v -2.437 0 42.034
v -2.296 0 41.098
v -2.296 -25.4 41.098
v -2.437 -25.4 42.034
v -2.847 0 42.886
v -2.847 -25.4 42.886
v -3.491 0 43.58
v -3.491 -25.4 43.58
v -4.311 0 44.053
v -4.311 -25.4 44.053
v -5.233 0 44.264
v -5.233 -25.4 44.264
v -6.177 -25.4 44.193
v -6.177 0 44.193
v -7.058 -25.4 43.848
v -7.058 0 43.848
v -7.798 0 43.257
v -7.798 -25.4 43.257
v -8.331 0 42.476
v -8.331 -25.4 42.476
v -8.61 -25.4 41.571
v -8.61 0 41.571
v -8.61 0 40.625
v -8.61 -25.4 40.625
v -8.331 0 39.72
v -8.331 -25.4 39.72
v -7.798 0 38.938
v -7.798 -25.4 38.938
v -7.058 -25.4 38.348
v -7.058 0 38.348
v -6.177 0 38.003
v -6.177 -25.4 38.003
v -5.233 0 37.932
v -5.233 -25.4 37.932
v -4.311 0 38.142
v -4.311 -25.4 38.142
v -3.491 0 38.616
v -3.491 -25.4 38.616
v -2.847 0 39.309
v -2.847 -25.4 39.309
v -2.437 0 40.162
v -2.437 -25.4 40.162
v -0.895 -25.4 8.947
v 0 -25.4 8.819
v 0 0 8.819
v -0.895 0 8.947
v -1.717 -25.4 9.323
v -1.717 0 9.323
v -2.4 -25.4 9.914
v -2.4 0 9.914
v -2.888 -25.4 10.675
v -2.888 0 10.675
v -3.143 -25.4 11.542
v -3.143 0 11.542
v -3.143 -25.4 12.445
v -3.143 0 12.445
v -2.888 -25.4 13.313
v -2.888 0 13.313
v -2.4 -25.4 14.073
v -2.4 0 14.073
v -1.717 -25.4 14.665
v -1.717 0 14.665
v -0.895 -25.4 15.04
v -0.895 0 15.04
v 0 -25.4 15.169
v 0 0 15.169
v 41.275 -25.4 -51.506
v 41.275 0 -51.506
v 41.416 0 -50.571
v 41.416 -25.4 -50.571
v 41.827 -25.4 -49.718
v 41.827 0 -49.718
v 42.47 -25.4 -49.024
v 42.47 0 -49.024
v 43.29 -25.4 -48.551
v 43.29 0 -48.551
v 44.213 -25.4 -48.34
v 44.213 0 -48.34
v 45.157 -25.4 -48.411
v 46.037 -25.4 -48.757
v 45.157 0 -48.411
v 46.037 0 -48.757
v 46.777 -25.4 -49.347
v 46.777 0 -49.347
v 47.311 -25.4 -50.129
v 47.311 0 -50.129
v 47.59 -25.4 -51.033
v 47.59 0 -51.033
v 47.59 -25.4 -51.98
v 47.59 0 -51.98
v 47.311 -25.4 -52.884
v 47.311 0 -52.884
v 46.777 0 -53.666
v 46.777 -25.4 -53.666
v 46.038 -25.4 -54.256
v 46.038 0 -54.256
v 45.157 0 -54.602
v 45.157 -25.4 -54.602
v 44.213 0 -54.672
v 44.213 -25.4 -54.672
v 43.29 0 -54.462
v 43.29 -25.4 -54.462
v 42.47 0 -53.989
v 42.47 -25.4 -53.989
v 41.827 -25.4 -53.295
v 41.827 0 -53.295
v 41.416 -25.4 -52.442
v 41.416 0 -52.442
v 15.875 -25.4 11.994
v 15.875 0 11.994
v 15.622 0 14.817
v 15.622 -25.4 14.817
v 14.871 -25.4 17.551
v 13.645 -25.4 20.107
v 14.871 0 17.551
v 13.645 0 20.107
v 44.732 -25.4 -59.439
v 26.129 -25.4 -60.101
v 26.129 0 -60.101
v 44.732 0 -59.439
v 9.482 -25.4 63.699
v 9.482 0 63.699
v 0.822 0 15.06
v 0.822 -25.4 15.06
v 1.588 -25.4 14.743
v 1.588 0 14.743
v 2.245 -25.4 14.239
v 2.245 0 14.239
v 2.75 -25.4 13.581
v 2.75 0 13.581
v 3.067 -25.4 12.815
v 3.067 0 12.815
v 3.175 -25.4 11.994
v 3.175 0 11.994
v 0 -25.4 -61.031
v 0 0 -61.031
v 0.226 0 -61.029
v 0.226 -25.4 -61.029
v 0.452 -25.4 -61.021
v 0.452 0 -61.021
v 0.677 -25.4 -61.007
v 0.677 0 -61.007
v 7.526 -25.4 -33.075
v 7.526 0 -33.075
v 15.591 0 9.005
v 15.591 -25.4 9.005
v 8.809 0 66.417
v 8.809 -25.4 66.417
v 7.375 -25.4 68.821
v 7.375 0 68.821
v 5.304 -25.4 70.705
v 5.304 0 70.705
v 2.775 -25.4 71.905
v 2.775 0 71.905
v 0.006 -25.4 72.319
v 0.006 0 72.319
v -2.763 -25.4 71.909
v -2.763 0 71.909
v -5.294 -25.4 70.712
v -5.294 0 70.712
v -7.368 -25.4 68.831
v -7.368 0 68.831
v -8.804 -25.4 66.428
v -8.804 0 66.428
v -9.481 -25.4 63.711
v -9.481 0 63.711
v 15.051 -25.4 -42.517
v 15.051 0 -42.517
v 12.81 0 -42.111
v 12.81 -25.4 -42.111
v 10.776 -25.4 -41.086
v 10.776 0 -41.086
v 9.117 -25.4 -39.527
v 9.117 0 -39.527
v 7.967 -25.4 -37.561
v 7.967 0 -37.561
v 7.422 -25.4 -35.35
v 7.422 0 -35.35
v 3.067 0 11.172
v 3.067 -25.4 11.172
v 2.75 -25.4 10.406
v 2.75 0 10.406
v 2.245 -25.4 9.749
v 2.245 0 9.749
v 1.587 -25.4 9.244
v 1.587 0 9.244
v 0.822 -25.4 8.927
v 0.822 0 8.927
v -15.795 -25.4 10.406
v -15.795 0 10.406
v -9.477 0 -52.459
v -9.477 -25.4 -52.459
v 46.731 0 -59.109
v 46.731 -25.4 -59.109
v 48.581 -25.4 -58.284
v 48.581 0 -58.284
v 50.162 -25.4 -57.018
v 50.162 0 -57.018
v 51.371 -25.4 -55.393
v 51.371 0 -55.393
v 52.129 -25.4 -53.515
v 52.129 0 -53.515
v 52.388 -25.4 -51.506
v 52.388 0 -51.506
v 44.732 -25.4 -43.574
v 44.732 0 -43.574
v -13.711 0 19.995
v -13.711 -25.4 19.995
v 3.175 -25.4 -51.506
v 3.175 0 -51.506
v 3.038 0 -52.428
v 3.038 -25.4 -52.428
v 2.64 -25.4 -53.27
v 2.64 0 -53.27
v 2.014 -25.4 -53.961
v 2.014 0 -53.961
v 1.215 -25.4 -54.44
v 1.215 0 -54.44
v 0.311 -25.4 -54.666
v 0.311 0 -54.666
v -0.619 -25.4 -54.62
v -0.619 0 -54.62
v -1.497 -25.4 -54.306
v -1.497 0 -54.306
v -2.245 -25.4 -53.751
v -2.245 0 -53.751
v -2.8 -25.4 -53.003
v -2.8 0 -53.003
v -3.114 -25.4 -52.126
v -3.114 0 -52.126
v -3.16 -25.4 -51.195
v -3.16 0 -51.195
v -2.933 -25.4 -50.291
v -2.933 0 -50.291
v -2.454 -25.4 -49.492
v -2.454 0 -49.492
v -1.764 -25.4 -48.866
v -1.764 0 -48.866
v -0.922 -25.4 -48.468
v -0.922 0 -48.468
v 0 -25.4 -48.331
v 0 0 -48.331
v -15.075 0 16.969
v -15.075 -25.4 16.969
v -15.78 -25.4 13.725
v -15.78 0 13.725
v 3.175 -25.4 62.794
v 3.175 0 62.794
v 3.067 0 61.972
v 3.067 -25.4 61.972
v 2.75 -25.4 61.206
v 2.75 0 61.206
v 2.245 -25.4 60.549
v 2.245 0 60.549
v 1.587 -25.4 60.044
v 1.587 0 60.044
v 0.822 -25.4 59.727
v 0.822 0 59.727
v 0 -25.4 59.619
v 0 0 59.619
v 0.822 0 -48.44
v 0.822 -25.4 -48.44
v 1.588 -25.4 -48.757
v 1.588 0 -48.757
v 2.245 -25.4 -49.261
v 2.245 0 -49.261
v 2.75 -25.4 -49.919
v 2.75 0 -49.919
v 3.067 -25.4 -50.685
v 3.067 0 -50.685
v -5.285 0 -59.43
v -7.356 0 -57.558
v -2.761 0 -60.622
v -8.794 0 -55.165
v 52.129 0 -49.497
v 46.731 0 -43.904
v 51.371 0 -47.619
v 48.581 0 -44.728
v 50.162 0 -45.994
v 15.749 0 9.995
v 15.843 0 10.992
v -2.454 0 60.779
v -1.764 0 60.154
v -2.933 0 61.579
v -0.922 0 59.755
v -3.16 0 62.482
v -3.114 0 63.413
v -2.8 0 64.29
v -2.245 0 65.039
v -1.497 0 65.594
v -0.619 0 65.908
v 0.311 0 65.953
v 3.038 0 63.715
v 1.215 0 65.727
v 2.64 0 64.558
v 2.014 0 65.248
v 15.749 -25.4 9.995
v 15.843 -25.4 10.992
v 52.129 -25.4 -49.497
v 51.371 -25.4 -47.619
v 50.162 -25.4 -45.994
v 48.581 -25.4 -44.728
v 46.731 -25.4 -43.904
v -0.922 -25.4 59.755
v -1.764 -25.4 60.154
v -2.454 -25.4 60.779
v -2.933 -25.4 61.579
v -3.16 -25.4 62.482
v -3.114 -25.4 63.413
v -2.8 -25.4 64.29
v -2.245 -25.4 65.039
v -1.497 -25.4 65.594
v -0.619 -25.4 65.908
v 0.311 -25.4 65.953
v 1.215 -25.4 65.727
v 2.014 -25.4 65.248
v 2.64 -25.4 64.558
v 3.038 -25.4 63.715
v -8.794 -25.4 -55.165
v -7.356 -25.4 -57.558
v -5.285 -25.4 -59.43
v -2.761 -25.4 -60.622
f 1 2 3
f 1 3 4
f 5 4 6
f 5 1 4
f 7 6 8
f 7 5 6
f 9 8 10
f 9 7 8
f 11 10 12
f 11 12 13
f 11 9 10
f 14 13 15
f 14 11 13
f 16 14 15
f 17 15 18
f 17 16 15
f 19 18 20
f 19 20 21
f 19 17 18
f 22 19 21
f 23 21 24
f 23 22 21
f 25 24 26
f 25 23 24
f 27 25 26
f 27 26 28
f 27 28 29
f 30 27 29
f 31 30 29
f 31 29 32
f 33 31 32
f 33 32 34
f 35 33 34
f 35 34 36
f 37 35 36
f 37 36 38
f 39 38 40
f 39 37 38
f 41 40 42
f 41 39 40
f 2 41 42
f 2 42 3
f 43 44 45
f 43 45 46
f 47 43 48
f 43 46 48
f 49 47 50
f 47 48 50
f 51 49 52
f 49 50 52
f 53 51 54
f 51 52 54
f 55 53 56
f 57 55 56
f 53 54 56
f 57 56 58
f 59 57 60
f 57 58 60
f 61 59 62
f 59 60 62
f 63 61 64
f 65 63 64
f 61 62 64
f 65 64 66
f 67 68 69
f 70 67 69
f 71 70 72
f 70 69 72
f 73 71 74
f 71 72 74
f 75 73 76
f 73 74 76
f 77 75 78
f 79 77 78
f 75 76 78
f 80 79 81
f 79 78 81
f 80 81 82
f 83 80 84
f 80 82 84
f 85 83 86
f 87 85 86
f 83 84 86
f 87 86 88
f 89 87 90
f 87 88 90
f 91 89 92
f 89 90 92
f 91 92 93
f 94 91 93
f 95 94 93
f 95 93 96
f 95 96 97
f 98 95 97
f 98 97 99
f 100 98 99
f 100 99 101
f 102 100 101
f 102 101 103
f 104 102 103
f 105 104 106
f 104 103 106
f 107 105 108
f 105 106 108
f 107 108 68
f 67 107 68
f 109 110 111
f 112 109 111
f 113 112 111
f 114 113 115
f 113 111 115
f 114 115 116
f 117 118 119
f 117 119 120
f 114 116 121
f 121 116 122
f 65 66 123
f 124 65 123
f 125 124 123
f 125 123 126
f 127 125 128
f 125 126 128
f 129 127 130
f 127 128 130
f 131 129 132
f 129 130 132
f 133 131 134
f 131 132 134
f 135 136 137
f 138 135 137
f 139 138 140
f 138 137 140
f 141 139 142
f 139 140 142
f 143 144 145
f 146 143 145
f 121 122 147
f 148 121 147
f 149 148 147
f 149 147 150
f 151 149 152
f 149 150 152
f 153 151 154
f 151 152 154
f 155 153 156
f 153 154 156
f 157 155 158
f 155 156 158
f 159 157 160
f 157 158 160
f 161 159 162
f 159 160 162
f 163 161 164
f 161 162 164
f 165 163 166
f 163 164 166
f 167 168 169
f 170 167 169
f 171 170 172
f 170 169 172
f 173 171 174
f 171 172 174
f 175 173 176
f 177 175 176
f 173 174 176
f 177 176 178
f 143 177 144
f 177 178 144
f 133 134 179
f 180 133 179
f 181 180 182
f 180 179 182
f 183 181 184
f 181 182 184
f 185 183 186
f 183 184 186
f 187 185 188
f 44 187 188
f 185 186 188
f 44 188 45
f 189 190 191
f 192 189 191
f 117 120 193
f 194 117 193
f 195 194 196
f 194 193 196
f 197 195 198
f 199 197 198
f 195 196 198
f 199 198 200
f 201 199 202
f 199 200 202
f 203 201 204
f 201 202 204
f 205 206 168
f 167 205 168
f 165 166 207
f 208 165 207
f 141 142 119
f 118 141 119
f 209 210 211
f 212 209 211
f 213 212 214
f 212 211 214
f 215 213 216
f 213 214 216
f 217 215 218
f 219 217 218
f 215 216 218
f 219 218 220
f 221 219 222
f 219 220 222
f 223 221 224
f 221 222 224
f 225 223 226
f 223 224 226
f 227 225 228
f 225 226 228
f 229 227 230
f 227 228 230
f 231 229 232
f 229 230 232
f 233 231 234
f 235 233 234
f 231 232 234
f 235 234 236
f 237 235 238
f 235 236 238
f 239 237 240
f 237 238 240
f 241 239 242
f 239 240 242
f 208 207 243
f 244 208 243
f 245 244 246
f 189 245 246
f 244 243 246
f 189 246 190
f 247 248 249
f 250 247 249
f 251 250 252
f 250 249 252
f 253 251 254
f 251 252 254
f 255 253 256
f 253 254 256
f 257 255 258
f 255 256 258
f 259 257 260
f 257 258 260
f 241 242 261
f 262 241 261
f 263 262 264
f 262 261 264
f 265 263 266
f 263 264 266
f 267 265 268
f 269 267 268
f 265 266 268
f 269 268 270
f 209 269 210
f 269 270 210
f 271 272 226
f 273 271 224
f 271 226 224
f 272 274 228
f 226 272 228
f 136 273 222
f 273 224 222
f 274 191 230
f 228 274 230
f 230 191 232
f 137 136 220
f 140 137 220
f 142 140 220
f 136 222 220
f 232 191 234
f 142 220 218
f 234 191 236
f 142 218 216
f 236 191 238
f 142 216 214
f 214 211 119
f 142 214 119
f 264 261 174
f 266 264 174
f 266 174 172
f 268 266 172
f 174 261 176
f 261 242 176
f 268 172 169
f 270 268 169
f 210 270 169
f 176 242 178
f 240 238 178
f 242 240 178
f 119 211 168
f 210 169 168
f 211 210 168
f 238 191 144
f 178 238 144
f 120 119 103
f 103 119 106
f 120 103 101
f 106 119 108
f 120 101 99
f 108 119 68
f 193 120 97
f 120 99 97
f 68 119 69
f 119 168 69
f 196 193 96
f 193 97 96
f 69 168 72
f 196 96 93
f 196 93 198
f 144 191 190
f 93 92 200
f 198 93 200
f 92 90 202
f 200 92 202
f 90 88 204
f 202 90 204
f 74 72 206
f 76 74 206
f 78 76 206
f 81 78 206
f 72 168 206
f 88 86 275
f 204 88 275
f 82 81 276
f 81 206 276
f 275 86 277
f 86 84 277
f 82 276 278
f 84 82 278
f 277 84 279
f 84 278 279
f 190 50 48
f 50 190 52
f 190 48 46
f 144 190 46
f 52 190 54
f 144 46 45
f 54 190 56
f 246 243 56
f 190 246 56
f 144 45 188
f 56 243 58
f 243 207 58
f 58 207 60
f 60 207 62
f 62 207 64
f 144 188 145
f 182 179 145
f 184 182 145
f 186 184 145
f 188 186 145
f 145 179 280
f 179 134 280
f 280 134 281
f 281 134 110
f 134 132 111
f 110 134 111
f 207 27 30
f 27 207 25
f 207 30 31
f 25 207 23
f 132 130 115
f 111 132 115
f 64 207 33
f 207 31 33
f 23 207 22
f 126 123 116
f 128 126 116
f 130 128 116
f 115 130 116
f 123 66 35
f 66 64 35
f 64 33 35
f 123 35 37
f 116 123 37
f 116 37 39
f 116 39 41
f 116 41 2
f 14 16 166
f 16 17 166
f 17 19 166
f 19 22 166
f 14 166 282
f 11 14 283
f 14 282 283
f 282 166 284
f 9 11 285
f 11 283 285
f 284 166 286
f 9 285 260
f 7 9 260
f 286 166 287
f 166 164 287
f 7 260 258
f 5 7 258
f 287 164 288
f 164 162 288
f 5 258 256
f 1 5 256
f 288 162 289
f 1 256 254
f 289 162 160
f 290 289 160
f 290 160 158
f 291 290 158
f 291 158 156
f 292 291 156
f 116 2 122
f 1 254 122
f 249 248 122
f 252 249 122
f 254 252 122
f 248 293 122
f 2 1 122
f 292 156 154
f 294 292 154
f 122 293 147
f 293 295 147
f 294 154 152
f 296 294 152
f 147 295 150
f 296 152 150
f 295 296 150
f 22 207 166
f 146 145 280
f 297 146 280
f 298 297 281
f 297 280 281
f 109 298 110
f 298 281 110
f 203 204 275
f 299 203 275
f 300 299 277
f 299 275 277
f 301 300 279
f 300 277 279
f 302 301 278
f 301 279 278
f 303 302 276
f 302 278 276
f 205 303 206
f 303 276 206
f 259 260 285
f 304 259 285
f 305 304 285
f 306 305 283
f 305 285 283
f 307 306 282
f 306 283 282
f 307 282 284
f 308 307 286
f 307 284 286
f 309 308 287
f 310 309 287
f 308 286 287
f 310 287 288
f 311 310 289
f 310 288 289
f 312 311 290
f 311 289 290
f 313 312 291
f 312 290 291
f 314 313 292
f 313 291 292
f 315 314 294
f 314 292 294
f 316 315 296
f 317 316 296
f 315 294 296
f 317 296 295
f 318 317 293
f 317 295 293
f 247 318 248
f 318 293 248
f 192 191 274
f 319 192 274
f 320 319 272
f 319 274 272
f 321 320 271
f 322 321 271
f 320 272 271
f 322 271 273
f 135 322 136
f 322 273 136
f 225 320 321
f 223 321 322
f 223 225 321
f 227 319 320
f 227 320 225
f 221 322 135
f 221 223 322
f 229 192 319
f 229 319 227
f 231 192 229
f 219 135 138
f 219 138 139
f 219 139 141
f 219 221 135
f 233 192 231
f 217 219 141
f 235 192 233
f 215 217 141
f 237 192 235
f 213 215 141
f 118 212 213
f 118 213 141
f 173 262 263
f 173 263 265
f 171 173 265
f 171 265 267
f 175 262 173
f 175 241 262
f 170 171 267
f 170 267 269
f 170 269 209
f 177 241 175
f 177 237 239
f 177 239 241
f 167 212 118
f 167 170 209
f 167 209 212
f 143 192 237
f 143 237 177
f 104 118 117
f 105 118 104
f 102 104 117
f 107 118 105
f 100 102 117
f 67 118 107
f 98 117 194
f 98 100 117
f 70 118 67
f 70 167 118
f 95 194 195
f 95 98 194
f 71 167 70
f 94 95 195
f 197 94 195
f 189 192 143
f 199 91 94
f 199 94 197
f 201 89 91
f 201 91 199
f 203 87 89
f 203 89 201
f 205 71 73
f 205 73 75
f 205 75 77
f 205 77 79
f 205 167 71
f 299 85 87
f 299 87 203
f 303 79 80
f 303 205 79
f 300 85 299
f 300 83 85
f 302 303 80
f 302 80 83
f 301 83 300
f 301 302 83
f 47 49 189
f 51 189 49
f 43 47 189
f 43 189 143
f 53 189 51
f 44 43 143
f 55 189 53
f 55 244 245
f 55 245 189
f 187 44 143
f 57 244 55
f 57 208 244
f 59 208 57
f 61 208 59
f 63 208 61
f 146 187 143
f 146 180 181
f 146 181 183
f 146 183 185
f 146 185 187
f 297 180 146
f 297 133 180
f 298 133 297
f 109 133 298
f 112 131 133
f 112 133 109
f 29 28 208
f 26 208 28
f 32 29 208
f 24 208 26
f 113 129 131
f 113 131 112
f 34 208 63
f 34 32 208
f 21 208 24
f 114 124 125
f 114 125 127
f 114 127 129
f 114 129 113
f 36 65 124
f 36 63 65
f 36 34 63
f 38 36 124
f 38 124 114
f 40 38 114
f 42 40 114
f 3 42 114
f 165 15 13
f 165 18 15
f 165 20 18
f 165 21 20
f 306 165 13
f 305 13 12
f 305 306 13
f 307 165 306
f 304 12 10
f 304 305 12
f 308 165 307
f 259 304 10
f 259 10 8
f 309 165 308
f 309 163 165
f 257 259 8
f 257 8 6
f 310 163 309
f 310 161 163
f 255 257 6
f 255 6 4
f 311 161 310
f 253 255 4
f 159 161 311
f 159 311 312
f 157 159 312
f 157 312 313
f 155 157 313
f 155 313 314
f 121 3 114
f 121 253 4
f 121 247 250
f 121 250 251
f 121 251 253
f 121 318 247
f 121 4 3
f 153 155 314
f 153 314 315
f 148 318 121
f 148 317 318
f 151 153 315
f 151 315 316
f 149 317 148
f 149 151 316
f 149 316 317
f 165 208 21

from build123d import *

# Parameters (mm, degrees)
F0_R     = 3.175
F1_DEPTH = 25.4
F2_DEPTH = 25.4


with BuildPart() as f1:
    # F0 (on Front) → F1 (new body)
    with BuildSketch(Plane.XZ):
        with BuildLine():
            ThreePointArc((-9.4807107481, 63.7111065744), (-7.0521101036, 56.3910315801), (0, 53.2686379311))
            ThreePointArc((0, 53.2686379311), (6.7351920908, 56.0584458403), (9.525, 62.7936379311))
            ThreePointArc((9.525, 62.7936379311), (9.5142081889, 63.2469232041), (9.4818572097, 63.6991813339))
            ThreePointArc((9.4818572097, 63.6991813339), (0.0059901113, 72.3186360476), (-9.4807107481, 63.7111065744))
        make_face()
        with BuildLine():
            ThreePointArc((3.175, 62.7936379311), (2.2450640303, 60.5485739009), (0, 59.6186379311))
            ThreePointArc((0, 59.6186379311), (-2.2450640303, 65.0387019614), (3.175, 62.7936379311))
        make_face(mode=Mode.SUBTRACT)
        with BuildLine():
            ThreePointArc((9.525, 62.7936379311), (6.7351920908, 56.0584458403), (0, 53.2686379311))
            Line((0, 53.2686379311), (0, 27.8686379311))
            ThreePointArc((0, 27.8686379311), (7.8489973512, 25.7925098263), (13.6450153015, 20.1071564294))
            Line((13.6450153015, 20.1071564294), (9.4818572097, 63.6991813339))
            ThreePointArc((9.4818572097, 63.6991813339), (9.5142081889, 63.2469232041), (9.525, 62.7936379311))
        make_face()
        with BuildLine():
            Line((0, 27.8686379311), (0, 53.2686379311))
            ThreePointArc((0, 53.2686379311), (-7.0521101036, 56.3910315801), (-9.4807107481, 63.7111065744))
            Line((-9.4807107481, 63.7111065744), (-13.7112371906, 19.9947378369))
            ThreePointArc((-13.7112371906, 19.9947378369), (-7.9056360907, 25.7601386849), (0, 27.8686379311))
        make_face()
        with Locations((-5.4705687799, 41.0979501903)):
            Circle(F0_R, mode=Mode.SUBTRACT)
        with BuildLine():
            ThreePointArc((13.6450153015, 20.1071564294), (7.8489973512, 25.7925098263), (0, 27.8686379311))
            Line((0, 27.8686379311), (0, 15.1686379311))
            ThreePointArc((0, 15.1686379311), (2.2450640303, 14.2387019614), (3.175, 11.9936379311))
            ThreePointArc((3.175, 11.9936379311), (2.2450640303, 9.7485739009), (0, 8.8186379311))
            Line((0, 8.8186379311), (0, -3.8813620689))
            ThreePointArc((0, -3.8813620689), (10.1137339683, -0.2427018083), (15.5911917947, 9.005266565))
            ThreePointArc((15.5911917947, 9.005266565), (15.8038886787, 10.4927289966), (15.875, 11.9936379311))
            ThreePointArc((15.875, 11.9936379311), (15.3073551424, 16.2008345684), (13.6450153015, 20.1071564294))
        make_face()
        with BuildLine():
            Line((0, 15.1686379311), (0, 27.8686379311))
            ThreePointArc((0, 27.8686379311), (-7.9056360907, 25.7601386849), (-13.7112371906, 19.9947378369))
            ThreePointArc((-13.7112371906, 19.9947378369), (-15.5127721175, 15.3655107389), (-15.7954255641, 10.4061379311))
            ThreePointArc((-15.7954255641, 10.4061379311), (-10.6492737428, 0.2204228329), (0, -3.8813620689))
            Line((0, -3.8813620689), (0, 8.8186379311))
            ThreePointArc((0, 8.8186379311), (-3.175, 11.9936379311), (0, 15.1686379311))
        make_face()
        with BuildLine():
            ThreePointArc((0, -3.8813620689), (-10.6492737428, 0.2204228329), (-15.7954255641, 10.4061379311))
            Line((-15.7954255641, 10.4061379311), (-9.4772553384, -52.4588620689))
            ThreePointArc((-9.4772553384, -52.4588620689), (-7.063929059, -45.1167978232), (0, -41.9813620689))
            Line((0, -41.9813620689), (0, -3.8813620689))
        make_face()
        with BuildLine():
            ThreePointArc((15.5911917947, 9.005266565), (10.1137339683, -0.2427018083), (0, -3.8813620689))
            Line((0, -3.8813620689), (0, -41.9813620689))
            ThreePointArc((0, -41.9813620689), (6.7351920908, -44.7711699781), (9.525, -51.5063620689))
            Line((9.525, -51.5063620689), (36.5125, -51.5063620689))
            ThreePointArc((36.5125, -51.5063620689), (38.9380895153, -45.7947292849), (44.7324052746, -43.5738874543))
            Line((44.7324052746, -43.5738874543), (15.0507731119, -42.5171870062))
            ThreePointArc((15.0507731119, -42.5171870062), (9.1165249373, -39.5271472478), (7.5255613841, -33.075444052))
            Line((7.5255613841, -33.075444052), (15.5911917947, 9.005266565))
        make_face()
        with BuildLine():
            ThreePointArc((0, -41.9813620689), (-7.063929059, -45.1167978232), (-9.4772553384, -52.4588620689))
            ThreePointArc((-9.4772553384, -52.4588620689), (-6.3895642457, -58.5702911278), (0, -61.0313620689))
            Line((0, -61.0313620689), (0.6773435479, -61.0072478548))
            ThreePointArc((0.6773435479, -61.0072478548), (6.9705567315, -57.9976611571), (9.525, -51.5063620689))
            Line((9.525, -51.5063620689), (3.175, -51.5063620689))
            ThreePointArc((3.175, -51.5063620689), (-2.2450640303, -53.7514260991), (0, -48.3313620689))
            Line((0, -48.3313620689), (0, -41.9813620689))
        make_face()
        with BuildLine():
            Line((0.6773435479, -61.0072478548), (0, -61.0313620689))
            ThreePointArc((0, -61.0313620689), (0.3388863295, -61.0253316064), (0.6773435479, -61.0072478548))
        make_face()
        with BuildLine():
            Line((36.5125, -51.5063620689), (9.525, -51.5063620689))
            ThreePointArc((9.525, -51.5063620689), (6.9705567315, -57.9976611571), (0.6773435479, -61.0072478548))
            Line((0.6773435479, -61.0072478548), (26.128586054, -60.1011541732))
            Line((26.128586054, -60.1011541732), (44.7324052746, -59.4388366834))
            ThreePointArc((44.7324052746, -59.4388366834), (38.9380895153, -57.2179948528), (36.5125, -51.5063620689))
        make_face()
        with BuildLine():
            ThreePointArc((44.7324052746, -43.5738874543), (38.9380895153, -45.7947292849), (36.5125, -51.5063620689))
            ThreePointArc((36.5125, -51.5063620689), (38.9380895153, -57.2179948528), (44.7324052746, -59.4388366834))
            ThreePointArc((44.7324052746, -59.4388366834), (50.1616327839, -57.0182725536), (52.3875, -51.5063620689))
            ThreePointArc((52.3875, -51.5063620689), (50.1616327839, -45.9944515841), (44.7324052746, -43.5738874543))
        make_face()
        with BuildLine():
            ThreePointArc((47.625, -51.5063620689), (44.45, -54.6813620689), (41.275, -51.5063620689))
            ThreePointArc((41.275, -51.5063620689), (44.45, -48.3313620689), (47.625, -51.5063620689))
        make_face(mode=Mode.SUBTRACT)
    extrude(amount=F1_DEPTH)

    # F0 (on Front) → F2 (join)
    with BuildSketch(Plane.XZ):
        with BuildLine():
            ThreePointArc((9.525, -51.5063620689), (6.7351920908, -44.7711699781), (0, -41.9813620689))
            Line((0, -41.9813620689), (0, -48.3313620689))
            ThreePointArc((0, -48.3313620689), (2.2450640303, -49.2612980386), (3.175, -51.5063620689))
            Line((3.175, -51.5063620689), (9.525, -51.5063620689))
        make_face()
    extrude(amount=F2_DEPTH)


solid = f1.part
